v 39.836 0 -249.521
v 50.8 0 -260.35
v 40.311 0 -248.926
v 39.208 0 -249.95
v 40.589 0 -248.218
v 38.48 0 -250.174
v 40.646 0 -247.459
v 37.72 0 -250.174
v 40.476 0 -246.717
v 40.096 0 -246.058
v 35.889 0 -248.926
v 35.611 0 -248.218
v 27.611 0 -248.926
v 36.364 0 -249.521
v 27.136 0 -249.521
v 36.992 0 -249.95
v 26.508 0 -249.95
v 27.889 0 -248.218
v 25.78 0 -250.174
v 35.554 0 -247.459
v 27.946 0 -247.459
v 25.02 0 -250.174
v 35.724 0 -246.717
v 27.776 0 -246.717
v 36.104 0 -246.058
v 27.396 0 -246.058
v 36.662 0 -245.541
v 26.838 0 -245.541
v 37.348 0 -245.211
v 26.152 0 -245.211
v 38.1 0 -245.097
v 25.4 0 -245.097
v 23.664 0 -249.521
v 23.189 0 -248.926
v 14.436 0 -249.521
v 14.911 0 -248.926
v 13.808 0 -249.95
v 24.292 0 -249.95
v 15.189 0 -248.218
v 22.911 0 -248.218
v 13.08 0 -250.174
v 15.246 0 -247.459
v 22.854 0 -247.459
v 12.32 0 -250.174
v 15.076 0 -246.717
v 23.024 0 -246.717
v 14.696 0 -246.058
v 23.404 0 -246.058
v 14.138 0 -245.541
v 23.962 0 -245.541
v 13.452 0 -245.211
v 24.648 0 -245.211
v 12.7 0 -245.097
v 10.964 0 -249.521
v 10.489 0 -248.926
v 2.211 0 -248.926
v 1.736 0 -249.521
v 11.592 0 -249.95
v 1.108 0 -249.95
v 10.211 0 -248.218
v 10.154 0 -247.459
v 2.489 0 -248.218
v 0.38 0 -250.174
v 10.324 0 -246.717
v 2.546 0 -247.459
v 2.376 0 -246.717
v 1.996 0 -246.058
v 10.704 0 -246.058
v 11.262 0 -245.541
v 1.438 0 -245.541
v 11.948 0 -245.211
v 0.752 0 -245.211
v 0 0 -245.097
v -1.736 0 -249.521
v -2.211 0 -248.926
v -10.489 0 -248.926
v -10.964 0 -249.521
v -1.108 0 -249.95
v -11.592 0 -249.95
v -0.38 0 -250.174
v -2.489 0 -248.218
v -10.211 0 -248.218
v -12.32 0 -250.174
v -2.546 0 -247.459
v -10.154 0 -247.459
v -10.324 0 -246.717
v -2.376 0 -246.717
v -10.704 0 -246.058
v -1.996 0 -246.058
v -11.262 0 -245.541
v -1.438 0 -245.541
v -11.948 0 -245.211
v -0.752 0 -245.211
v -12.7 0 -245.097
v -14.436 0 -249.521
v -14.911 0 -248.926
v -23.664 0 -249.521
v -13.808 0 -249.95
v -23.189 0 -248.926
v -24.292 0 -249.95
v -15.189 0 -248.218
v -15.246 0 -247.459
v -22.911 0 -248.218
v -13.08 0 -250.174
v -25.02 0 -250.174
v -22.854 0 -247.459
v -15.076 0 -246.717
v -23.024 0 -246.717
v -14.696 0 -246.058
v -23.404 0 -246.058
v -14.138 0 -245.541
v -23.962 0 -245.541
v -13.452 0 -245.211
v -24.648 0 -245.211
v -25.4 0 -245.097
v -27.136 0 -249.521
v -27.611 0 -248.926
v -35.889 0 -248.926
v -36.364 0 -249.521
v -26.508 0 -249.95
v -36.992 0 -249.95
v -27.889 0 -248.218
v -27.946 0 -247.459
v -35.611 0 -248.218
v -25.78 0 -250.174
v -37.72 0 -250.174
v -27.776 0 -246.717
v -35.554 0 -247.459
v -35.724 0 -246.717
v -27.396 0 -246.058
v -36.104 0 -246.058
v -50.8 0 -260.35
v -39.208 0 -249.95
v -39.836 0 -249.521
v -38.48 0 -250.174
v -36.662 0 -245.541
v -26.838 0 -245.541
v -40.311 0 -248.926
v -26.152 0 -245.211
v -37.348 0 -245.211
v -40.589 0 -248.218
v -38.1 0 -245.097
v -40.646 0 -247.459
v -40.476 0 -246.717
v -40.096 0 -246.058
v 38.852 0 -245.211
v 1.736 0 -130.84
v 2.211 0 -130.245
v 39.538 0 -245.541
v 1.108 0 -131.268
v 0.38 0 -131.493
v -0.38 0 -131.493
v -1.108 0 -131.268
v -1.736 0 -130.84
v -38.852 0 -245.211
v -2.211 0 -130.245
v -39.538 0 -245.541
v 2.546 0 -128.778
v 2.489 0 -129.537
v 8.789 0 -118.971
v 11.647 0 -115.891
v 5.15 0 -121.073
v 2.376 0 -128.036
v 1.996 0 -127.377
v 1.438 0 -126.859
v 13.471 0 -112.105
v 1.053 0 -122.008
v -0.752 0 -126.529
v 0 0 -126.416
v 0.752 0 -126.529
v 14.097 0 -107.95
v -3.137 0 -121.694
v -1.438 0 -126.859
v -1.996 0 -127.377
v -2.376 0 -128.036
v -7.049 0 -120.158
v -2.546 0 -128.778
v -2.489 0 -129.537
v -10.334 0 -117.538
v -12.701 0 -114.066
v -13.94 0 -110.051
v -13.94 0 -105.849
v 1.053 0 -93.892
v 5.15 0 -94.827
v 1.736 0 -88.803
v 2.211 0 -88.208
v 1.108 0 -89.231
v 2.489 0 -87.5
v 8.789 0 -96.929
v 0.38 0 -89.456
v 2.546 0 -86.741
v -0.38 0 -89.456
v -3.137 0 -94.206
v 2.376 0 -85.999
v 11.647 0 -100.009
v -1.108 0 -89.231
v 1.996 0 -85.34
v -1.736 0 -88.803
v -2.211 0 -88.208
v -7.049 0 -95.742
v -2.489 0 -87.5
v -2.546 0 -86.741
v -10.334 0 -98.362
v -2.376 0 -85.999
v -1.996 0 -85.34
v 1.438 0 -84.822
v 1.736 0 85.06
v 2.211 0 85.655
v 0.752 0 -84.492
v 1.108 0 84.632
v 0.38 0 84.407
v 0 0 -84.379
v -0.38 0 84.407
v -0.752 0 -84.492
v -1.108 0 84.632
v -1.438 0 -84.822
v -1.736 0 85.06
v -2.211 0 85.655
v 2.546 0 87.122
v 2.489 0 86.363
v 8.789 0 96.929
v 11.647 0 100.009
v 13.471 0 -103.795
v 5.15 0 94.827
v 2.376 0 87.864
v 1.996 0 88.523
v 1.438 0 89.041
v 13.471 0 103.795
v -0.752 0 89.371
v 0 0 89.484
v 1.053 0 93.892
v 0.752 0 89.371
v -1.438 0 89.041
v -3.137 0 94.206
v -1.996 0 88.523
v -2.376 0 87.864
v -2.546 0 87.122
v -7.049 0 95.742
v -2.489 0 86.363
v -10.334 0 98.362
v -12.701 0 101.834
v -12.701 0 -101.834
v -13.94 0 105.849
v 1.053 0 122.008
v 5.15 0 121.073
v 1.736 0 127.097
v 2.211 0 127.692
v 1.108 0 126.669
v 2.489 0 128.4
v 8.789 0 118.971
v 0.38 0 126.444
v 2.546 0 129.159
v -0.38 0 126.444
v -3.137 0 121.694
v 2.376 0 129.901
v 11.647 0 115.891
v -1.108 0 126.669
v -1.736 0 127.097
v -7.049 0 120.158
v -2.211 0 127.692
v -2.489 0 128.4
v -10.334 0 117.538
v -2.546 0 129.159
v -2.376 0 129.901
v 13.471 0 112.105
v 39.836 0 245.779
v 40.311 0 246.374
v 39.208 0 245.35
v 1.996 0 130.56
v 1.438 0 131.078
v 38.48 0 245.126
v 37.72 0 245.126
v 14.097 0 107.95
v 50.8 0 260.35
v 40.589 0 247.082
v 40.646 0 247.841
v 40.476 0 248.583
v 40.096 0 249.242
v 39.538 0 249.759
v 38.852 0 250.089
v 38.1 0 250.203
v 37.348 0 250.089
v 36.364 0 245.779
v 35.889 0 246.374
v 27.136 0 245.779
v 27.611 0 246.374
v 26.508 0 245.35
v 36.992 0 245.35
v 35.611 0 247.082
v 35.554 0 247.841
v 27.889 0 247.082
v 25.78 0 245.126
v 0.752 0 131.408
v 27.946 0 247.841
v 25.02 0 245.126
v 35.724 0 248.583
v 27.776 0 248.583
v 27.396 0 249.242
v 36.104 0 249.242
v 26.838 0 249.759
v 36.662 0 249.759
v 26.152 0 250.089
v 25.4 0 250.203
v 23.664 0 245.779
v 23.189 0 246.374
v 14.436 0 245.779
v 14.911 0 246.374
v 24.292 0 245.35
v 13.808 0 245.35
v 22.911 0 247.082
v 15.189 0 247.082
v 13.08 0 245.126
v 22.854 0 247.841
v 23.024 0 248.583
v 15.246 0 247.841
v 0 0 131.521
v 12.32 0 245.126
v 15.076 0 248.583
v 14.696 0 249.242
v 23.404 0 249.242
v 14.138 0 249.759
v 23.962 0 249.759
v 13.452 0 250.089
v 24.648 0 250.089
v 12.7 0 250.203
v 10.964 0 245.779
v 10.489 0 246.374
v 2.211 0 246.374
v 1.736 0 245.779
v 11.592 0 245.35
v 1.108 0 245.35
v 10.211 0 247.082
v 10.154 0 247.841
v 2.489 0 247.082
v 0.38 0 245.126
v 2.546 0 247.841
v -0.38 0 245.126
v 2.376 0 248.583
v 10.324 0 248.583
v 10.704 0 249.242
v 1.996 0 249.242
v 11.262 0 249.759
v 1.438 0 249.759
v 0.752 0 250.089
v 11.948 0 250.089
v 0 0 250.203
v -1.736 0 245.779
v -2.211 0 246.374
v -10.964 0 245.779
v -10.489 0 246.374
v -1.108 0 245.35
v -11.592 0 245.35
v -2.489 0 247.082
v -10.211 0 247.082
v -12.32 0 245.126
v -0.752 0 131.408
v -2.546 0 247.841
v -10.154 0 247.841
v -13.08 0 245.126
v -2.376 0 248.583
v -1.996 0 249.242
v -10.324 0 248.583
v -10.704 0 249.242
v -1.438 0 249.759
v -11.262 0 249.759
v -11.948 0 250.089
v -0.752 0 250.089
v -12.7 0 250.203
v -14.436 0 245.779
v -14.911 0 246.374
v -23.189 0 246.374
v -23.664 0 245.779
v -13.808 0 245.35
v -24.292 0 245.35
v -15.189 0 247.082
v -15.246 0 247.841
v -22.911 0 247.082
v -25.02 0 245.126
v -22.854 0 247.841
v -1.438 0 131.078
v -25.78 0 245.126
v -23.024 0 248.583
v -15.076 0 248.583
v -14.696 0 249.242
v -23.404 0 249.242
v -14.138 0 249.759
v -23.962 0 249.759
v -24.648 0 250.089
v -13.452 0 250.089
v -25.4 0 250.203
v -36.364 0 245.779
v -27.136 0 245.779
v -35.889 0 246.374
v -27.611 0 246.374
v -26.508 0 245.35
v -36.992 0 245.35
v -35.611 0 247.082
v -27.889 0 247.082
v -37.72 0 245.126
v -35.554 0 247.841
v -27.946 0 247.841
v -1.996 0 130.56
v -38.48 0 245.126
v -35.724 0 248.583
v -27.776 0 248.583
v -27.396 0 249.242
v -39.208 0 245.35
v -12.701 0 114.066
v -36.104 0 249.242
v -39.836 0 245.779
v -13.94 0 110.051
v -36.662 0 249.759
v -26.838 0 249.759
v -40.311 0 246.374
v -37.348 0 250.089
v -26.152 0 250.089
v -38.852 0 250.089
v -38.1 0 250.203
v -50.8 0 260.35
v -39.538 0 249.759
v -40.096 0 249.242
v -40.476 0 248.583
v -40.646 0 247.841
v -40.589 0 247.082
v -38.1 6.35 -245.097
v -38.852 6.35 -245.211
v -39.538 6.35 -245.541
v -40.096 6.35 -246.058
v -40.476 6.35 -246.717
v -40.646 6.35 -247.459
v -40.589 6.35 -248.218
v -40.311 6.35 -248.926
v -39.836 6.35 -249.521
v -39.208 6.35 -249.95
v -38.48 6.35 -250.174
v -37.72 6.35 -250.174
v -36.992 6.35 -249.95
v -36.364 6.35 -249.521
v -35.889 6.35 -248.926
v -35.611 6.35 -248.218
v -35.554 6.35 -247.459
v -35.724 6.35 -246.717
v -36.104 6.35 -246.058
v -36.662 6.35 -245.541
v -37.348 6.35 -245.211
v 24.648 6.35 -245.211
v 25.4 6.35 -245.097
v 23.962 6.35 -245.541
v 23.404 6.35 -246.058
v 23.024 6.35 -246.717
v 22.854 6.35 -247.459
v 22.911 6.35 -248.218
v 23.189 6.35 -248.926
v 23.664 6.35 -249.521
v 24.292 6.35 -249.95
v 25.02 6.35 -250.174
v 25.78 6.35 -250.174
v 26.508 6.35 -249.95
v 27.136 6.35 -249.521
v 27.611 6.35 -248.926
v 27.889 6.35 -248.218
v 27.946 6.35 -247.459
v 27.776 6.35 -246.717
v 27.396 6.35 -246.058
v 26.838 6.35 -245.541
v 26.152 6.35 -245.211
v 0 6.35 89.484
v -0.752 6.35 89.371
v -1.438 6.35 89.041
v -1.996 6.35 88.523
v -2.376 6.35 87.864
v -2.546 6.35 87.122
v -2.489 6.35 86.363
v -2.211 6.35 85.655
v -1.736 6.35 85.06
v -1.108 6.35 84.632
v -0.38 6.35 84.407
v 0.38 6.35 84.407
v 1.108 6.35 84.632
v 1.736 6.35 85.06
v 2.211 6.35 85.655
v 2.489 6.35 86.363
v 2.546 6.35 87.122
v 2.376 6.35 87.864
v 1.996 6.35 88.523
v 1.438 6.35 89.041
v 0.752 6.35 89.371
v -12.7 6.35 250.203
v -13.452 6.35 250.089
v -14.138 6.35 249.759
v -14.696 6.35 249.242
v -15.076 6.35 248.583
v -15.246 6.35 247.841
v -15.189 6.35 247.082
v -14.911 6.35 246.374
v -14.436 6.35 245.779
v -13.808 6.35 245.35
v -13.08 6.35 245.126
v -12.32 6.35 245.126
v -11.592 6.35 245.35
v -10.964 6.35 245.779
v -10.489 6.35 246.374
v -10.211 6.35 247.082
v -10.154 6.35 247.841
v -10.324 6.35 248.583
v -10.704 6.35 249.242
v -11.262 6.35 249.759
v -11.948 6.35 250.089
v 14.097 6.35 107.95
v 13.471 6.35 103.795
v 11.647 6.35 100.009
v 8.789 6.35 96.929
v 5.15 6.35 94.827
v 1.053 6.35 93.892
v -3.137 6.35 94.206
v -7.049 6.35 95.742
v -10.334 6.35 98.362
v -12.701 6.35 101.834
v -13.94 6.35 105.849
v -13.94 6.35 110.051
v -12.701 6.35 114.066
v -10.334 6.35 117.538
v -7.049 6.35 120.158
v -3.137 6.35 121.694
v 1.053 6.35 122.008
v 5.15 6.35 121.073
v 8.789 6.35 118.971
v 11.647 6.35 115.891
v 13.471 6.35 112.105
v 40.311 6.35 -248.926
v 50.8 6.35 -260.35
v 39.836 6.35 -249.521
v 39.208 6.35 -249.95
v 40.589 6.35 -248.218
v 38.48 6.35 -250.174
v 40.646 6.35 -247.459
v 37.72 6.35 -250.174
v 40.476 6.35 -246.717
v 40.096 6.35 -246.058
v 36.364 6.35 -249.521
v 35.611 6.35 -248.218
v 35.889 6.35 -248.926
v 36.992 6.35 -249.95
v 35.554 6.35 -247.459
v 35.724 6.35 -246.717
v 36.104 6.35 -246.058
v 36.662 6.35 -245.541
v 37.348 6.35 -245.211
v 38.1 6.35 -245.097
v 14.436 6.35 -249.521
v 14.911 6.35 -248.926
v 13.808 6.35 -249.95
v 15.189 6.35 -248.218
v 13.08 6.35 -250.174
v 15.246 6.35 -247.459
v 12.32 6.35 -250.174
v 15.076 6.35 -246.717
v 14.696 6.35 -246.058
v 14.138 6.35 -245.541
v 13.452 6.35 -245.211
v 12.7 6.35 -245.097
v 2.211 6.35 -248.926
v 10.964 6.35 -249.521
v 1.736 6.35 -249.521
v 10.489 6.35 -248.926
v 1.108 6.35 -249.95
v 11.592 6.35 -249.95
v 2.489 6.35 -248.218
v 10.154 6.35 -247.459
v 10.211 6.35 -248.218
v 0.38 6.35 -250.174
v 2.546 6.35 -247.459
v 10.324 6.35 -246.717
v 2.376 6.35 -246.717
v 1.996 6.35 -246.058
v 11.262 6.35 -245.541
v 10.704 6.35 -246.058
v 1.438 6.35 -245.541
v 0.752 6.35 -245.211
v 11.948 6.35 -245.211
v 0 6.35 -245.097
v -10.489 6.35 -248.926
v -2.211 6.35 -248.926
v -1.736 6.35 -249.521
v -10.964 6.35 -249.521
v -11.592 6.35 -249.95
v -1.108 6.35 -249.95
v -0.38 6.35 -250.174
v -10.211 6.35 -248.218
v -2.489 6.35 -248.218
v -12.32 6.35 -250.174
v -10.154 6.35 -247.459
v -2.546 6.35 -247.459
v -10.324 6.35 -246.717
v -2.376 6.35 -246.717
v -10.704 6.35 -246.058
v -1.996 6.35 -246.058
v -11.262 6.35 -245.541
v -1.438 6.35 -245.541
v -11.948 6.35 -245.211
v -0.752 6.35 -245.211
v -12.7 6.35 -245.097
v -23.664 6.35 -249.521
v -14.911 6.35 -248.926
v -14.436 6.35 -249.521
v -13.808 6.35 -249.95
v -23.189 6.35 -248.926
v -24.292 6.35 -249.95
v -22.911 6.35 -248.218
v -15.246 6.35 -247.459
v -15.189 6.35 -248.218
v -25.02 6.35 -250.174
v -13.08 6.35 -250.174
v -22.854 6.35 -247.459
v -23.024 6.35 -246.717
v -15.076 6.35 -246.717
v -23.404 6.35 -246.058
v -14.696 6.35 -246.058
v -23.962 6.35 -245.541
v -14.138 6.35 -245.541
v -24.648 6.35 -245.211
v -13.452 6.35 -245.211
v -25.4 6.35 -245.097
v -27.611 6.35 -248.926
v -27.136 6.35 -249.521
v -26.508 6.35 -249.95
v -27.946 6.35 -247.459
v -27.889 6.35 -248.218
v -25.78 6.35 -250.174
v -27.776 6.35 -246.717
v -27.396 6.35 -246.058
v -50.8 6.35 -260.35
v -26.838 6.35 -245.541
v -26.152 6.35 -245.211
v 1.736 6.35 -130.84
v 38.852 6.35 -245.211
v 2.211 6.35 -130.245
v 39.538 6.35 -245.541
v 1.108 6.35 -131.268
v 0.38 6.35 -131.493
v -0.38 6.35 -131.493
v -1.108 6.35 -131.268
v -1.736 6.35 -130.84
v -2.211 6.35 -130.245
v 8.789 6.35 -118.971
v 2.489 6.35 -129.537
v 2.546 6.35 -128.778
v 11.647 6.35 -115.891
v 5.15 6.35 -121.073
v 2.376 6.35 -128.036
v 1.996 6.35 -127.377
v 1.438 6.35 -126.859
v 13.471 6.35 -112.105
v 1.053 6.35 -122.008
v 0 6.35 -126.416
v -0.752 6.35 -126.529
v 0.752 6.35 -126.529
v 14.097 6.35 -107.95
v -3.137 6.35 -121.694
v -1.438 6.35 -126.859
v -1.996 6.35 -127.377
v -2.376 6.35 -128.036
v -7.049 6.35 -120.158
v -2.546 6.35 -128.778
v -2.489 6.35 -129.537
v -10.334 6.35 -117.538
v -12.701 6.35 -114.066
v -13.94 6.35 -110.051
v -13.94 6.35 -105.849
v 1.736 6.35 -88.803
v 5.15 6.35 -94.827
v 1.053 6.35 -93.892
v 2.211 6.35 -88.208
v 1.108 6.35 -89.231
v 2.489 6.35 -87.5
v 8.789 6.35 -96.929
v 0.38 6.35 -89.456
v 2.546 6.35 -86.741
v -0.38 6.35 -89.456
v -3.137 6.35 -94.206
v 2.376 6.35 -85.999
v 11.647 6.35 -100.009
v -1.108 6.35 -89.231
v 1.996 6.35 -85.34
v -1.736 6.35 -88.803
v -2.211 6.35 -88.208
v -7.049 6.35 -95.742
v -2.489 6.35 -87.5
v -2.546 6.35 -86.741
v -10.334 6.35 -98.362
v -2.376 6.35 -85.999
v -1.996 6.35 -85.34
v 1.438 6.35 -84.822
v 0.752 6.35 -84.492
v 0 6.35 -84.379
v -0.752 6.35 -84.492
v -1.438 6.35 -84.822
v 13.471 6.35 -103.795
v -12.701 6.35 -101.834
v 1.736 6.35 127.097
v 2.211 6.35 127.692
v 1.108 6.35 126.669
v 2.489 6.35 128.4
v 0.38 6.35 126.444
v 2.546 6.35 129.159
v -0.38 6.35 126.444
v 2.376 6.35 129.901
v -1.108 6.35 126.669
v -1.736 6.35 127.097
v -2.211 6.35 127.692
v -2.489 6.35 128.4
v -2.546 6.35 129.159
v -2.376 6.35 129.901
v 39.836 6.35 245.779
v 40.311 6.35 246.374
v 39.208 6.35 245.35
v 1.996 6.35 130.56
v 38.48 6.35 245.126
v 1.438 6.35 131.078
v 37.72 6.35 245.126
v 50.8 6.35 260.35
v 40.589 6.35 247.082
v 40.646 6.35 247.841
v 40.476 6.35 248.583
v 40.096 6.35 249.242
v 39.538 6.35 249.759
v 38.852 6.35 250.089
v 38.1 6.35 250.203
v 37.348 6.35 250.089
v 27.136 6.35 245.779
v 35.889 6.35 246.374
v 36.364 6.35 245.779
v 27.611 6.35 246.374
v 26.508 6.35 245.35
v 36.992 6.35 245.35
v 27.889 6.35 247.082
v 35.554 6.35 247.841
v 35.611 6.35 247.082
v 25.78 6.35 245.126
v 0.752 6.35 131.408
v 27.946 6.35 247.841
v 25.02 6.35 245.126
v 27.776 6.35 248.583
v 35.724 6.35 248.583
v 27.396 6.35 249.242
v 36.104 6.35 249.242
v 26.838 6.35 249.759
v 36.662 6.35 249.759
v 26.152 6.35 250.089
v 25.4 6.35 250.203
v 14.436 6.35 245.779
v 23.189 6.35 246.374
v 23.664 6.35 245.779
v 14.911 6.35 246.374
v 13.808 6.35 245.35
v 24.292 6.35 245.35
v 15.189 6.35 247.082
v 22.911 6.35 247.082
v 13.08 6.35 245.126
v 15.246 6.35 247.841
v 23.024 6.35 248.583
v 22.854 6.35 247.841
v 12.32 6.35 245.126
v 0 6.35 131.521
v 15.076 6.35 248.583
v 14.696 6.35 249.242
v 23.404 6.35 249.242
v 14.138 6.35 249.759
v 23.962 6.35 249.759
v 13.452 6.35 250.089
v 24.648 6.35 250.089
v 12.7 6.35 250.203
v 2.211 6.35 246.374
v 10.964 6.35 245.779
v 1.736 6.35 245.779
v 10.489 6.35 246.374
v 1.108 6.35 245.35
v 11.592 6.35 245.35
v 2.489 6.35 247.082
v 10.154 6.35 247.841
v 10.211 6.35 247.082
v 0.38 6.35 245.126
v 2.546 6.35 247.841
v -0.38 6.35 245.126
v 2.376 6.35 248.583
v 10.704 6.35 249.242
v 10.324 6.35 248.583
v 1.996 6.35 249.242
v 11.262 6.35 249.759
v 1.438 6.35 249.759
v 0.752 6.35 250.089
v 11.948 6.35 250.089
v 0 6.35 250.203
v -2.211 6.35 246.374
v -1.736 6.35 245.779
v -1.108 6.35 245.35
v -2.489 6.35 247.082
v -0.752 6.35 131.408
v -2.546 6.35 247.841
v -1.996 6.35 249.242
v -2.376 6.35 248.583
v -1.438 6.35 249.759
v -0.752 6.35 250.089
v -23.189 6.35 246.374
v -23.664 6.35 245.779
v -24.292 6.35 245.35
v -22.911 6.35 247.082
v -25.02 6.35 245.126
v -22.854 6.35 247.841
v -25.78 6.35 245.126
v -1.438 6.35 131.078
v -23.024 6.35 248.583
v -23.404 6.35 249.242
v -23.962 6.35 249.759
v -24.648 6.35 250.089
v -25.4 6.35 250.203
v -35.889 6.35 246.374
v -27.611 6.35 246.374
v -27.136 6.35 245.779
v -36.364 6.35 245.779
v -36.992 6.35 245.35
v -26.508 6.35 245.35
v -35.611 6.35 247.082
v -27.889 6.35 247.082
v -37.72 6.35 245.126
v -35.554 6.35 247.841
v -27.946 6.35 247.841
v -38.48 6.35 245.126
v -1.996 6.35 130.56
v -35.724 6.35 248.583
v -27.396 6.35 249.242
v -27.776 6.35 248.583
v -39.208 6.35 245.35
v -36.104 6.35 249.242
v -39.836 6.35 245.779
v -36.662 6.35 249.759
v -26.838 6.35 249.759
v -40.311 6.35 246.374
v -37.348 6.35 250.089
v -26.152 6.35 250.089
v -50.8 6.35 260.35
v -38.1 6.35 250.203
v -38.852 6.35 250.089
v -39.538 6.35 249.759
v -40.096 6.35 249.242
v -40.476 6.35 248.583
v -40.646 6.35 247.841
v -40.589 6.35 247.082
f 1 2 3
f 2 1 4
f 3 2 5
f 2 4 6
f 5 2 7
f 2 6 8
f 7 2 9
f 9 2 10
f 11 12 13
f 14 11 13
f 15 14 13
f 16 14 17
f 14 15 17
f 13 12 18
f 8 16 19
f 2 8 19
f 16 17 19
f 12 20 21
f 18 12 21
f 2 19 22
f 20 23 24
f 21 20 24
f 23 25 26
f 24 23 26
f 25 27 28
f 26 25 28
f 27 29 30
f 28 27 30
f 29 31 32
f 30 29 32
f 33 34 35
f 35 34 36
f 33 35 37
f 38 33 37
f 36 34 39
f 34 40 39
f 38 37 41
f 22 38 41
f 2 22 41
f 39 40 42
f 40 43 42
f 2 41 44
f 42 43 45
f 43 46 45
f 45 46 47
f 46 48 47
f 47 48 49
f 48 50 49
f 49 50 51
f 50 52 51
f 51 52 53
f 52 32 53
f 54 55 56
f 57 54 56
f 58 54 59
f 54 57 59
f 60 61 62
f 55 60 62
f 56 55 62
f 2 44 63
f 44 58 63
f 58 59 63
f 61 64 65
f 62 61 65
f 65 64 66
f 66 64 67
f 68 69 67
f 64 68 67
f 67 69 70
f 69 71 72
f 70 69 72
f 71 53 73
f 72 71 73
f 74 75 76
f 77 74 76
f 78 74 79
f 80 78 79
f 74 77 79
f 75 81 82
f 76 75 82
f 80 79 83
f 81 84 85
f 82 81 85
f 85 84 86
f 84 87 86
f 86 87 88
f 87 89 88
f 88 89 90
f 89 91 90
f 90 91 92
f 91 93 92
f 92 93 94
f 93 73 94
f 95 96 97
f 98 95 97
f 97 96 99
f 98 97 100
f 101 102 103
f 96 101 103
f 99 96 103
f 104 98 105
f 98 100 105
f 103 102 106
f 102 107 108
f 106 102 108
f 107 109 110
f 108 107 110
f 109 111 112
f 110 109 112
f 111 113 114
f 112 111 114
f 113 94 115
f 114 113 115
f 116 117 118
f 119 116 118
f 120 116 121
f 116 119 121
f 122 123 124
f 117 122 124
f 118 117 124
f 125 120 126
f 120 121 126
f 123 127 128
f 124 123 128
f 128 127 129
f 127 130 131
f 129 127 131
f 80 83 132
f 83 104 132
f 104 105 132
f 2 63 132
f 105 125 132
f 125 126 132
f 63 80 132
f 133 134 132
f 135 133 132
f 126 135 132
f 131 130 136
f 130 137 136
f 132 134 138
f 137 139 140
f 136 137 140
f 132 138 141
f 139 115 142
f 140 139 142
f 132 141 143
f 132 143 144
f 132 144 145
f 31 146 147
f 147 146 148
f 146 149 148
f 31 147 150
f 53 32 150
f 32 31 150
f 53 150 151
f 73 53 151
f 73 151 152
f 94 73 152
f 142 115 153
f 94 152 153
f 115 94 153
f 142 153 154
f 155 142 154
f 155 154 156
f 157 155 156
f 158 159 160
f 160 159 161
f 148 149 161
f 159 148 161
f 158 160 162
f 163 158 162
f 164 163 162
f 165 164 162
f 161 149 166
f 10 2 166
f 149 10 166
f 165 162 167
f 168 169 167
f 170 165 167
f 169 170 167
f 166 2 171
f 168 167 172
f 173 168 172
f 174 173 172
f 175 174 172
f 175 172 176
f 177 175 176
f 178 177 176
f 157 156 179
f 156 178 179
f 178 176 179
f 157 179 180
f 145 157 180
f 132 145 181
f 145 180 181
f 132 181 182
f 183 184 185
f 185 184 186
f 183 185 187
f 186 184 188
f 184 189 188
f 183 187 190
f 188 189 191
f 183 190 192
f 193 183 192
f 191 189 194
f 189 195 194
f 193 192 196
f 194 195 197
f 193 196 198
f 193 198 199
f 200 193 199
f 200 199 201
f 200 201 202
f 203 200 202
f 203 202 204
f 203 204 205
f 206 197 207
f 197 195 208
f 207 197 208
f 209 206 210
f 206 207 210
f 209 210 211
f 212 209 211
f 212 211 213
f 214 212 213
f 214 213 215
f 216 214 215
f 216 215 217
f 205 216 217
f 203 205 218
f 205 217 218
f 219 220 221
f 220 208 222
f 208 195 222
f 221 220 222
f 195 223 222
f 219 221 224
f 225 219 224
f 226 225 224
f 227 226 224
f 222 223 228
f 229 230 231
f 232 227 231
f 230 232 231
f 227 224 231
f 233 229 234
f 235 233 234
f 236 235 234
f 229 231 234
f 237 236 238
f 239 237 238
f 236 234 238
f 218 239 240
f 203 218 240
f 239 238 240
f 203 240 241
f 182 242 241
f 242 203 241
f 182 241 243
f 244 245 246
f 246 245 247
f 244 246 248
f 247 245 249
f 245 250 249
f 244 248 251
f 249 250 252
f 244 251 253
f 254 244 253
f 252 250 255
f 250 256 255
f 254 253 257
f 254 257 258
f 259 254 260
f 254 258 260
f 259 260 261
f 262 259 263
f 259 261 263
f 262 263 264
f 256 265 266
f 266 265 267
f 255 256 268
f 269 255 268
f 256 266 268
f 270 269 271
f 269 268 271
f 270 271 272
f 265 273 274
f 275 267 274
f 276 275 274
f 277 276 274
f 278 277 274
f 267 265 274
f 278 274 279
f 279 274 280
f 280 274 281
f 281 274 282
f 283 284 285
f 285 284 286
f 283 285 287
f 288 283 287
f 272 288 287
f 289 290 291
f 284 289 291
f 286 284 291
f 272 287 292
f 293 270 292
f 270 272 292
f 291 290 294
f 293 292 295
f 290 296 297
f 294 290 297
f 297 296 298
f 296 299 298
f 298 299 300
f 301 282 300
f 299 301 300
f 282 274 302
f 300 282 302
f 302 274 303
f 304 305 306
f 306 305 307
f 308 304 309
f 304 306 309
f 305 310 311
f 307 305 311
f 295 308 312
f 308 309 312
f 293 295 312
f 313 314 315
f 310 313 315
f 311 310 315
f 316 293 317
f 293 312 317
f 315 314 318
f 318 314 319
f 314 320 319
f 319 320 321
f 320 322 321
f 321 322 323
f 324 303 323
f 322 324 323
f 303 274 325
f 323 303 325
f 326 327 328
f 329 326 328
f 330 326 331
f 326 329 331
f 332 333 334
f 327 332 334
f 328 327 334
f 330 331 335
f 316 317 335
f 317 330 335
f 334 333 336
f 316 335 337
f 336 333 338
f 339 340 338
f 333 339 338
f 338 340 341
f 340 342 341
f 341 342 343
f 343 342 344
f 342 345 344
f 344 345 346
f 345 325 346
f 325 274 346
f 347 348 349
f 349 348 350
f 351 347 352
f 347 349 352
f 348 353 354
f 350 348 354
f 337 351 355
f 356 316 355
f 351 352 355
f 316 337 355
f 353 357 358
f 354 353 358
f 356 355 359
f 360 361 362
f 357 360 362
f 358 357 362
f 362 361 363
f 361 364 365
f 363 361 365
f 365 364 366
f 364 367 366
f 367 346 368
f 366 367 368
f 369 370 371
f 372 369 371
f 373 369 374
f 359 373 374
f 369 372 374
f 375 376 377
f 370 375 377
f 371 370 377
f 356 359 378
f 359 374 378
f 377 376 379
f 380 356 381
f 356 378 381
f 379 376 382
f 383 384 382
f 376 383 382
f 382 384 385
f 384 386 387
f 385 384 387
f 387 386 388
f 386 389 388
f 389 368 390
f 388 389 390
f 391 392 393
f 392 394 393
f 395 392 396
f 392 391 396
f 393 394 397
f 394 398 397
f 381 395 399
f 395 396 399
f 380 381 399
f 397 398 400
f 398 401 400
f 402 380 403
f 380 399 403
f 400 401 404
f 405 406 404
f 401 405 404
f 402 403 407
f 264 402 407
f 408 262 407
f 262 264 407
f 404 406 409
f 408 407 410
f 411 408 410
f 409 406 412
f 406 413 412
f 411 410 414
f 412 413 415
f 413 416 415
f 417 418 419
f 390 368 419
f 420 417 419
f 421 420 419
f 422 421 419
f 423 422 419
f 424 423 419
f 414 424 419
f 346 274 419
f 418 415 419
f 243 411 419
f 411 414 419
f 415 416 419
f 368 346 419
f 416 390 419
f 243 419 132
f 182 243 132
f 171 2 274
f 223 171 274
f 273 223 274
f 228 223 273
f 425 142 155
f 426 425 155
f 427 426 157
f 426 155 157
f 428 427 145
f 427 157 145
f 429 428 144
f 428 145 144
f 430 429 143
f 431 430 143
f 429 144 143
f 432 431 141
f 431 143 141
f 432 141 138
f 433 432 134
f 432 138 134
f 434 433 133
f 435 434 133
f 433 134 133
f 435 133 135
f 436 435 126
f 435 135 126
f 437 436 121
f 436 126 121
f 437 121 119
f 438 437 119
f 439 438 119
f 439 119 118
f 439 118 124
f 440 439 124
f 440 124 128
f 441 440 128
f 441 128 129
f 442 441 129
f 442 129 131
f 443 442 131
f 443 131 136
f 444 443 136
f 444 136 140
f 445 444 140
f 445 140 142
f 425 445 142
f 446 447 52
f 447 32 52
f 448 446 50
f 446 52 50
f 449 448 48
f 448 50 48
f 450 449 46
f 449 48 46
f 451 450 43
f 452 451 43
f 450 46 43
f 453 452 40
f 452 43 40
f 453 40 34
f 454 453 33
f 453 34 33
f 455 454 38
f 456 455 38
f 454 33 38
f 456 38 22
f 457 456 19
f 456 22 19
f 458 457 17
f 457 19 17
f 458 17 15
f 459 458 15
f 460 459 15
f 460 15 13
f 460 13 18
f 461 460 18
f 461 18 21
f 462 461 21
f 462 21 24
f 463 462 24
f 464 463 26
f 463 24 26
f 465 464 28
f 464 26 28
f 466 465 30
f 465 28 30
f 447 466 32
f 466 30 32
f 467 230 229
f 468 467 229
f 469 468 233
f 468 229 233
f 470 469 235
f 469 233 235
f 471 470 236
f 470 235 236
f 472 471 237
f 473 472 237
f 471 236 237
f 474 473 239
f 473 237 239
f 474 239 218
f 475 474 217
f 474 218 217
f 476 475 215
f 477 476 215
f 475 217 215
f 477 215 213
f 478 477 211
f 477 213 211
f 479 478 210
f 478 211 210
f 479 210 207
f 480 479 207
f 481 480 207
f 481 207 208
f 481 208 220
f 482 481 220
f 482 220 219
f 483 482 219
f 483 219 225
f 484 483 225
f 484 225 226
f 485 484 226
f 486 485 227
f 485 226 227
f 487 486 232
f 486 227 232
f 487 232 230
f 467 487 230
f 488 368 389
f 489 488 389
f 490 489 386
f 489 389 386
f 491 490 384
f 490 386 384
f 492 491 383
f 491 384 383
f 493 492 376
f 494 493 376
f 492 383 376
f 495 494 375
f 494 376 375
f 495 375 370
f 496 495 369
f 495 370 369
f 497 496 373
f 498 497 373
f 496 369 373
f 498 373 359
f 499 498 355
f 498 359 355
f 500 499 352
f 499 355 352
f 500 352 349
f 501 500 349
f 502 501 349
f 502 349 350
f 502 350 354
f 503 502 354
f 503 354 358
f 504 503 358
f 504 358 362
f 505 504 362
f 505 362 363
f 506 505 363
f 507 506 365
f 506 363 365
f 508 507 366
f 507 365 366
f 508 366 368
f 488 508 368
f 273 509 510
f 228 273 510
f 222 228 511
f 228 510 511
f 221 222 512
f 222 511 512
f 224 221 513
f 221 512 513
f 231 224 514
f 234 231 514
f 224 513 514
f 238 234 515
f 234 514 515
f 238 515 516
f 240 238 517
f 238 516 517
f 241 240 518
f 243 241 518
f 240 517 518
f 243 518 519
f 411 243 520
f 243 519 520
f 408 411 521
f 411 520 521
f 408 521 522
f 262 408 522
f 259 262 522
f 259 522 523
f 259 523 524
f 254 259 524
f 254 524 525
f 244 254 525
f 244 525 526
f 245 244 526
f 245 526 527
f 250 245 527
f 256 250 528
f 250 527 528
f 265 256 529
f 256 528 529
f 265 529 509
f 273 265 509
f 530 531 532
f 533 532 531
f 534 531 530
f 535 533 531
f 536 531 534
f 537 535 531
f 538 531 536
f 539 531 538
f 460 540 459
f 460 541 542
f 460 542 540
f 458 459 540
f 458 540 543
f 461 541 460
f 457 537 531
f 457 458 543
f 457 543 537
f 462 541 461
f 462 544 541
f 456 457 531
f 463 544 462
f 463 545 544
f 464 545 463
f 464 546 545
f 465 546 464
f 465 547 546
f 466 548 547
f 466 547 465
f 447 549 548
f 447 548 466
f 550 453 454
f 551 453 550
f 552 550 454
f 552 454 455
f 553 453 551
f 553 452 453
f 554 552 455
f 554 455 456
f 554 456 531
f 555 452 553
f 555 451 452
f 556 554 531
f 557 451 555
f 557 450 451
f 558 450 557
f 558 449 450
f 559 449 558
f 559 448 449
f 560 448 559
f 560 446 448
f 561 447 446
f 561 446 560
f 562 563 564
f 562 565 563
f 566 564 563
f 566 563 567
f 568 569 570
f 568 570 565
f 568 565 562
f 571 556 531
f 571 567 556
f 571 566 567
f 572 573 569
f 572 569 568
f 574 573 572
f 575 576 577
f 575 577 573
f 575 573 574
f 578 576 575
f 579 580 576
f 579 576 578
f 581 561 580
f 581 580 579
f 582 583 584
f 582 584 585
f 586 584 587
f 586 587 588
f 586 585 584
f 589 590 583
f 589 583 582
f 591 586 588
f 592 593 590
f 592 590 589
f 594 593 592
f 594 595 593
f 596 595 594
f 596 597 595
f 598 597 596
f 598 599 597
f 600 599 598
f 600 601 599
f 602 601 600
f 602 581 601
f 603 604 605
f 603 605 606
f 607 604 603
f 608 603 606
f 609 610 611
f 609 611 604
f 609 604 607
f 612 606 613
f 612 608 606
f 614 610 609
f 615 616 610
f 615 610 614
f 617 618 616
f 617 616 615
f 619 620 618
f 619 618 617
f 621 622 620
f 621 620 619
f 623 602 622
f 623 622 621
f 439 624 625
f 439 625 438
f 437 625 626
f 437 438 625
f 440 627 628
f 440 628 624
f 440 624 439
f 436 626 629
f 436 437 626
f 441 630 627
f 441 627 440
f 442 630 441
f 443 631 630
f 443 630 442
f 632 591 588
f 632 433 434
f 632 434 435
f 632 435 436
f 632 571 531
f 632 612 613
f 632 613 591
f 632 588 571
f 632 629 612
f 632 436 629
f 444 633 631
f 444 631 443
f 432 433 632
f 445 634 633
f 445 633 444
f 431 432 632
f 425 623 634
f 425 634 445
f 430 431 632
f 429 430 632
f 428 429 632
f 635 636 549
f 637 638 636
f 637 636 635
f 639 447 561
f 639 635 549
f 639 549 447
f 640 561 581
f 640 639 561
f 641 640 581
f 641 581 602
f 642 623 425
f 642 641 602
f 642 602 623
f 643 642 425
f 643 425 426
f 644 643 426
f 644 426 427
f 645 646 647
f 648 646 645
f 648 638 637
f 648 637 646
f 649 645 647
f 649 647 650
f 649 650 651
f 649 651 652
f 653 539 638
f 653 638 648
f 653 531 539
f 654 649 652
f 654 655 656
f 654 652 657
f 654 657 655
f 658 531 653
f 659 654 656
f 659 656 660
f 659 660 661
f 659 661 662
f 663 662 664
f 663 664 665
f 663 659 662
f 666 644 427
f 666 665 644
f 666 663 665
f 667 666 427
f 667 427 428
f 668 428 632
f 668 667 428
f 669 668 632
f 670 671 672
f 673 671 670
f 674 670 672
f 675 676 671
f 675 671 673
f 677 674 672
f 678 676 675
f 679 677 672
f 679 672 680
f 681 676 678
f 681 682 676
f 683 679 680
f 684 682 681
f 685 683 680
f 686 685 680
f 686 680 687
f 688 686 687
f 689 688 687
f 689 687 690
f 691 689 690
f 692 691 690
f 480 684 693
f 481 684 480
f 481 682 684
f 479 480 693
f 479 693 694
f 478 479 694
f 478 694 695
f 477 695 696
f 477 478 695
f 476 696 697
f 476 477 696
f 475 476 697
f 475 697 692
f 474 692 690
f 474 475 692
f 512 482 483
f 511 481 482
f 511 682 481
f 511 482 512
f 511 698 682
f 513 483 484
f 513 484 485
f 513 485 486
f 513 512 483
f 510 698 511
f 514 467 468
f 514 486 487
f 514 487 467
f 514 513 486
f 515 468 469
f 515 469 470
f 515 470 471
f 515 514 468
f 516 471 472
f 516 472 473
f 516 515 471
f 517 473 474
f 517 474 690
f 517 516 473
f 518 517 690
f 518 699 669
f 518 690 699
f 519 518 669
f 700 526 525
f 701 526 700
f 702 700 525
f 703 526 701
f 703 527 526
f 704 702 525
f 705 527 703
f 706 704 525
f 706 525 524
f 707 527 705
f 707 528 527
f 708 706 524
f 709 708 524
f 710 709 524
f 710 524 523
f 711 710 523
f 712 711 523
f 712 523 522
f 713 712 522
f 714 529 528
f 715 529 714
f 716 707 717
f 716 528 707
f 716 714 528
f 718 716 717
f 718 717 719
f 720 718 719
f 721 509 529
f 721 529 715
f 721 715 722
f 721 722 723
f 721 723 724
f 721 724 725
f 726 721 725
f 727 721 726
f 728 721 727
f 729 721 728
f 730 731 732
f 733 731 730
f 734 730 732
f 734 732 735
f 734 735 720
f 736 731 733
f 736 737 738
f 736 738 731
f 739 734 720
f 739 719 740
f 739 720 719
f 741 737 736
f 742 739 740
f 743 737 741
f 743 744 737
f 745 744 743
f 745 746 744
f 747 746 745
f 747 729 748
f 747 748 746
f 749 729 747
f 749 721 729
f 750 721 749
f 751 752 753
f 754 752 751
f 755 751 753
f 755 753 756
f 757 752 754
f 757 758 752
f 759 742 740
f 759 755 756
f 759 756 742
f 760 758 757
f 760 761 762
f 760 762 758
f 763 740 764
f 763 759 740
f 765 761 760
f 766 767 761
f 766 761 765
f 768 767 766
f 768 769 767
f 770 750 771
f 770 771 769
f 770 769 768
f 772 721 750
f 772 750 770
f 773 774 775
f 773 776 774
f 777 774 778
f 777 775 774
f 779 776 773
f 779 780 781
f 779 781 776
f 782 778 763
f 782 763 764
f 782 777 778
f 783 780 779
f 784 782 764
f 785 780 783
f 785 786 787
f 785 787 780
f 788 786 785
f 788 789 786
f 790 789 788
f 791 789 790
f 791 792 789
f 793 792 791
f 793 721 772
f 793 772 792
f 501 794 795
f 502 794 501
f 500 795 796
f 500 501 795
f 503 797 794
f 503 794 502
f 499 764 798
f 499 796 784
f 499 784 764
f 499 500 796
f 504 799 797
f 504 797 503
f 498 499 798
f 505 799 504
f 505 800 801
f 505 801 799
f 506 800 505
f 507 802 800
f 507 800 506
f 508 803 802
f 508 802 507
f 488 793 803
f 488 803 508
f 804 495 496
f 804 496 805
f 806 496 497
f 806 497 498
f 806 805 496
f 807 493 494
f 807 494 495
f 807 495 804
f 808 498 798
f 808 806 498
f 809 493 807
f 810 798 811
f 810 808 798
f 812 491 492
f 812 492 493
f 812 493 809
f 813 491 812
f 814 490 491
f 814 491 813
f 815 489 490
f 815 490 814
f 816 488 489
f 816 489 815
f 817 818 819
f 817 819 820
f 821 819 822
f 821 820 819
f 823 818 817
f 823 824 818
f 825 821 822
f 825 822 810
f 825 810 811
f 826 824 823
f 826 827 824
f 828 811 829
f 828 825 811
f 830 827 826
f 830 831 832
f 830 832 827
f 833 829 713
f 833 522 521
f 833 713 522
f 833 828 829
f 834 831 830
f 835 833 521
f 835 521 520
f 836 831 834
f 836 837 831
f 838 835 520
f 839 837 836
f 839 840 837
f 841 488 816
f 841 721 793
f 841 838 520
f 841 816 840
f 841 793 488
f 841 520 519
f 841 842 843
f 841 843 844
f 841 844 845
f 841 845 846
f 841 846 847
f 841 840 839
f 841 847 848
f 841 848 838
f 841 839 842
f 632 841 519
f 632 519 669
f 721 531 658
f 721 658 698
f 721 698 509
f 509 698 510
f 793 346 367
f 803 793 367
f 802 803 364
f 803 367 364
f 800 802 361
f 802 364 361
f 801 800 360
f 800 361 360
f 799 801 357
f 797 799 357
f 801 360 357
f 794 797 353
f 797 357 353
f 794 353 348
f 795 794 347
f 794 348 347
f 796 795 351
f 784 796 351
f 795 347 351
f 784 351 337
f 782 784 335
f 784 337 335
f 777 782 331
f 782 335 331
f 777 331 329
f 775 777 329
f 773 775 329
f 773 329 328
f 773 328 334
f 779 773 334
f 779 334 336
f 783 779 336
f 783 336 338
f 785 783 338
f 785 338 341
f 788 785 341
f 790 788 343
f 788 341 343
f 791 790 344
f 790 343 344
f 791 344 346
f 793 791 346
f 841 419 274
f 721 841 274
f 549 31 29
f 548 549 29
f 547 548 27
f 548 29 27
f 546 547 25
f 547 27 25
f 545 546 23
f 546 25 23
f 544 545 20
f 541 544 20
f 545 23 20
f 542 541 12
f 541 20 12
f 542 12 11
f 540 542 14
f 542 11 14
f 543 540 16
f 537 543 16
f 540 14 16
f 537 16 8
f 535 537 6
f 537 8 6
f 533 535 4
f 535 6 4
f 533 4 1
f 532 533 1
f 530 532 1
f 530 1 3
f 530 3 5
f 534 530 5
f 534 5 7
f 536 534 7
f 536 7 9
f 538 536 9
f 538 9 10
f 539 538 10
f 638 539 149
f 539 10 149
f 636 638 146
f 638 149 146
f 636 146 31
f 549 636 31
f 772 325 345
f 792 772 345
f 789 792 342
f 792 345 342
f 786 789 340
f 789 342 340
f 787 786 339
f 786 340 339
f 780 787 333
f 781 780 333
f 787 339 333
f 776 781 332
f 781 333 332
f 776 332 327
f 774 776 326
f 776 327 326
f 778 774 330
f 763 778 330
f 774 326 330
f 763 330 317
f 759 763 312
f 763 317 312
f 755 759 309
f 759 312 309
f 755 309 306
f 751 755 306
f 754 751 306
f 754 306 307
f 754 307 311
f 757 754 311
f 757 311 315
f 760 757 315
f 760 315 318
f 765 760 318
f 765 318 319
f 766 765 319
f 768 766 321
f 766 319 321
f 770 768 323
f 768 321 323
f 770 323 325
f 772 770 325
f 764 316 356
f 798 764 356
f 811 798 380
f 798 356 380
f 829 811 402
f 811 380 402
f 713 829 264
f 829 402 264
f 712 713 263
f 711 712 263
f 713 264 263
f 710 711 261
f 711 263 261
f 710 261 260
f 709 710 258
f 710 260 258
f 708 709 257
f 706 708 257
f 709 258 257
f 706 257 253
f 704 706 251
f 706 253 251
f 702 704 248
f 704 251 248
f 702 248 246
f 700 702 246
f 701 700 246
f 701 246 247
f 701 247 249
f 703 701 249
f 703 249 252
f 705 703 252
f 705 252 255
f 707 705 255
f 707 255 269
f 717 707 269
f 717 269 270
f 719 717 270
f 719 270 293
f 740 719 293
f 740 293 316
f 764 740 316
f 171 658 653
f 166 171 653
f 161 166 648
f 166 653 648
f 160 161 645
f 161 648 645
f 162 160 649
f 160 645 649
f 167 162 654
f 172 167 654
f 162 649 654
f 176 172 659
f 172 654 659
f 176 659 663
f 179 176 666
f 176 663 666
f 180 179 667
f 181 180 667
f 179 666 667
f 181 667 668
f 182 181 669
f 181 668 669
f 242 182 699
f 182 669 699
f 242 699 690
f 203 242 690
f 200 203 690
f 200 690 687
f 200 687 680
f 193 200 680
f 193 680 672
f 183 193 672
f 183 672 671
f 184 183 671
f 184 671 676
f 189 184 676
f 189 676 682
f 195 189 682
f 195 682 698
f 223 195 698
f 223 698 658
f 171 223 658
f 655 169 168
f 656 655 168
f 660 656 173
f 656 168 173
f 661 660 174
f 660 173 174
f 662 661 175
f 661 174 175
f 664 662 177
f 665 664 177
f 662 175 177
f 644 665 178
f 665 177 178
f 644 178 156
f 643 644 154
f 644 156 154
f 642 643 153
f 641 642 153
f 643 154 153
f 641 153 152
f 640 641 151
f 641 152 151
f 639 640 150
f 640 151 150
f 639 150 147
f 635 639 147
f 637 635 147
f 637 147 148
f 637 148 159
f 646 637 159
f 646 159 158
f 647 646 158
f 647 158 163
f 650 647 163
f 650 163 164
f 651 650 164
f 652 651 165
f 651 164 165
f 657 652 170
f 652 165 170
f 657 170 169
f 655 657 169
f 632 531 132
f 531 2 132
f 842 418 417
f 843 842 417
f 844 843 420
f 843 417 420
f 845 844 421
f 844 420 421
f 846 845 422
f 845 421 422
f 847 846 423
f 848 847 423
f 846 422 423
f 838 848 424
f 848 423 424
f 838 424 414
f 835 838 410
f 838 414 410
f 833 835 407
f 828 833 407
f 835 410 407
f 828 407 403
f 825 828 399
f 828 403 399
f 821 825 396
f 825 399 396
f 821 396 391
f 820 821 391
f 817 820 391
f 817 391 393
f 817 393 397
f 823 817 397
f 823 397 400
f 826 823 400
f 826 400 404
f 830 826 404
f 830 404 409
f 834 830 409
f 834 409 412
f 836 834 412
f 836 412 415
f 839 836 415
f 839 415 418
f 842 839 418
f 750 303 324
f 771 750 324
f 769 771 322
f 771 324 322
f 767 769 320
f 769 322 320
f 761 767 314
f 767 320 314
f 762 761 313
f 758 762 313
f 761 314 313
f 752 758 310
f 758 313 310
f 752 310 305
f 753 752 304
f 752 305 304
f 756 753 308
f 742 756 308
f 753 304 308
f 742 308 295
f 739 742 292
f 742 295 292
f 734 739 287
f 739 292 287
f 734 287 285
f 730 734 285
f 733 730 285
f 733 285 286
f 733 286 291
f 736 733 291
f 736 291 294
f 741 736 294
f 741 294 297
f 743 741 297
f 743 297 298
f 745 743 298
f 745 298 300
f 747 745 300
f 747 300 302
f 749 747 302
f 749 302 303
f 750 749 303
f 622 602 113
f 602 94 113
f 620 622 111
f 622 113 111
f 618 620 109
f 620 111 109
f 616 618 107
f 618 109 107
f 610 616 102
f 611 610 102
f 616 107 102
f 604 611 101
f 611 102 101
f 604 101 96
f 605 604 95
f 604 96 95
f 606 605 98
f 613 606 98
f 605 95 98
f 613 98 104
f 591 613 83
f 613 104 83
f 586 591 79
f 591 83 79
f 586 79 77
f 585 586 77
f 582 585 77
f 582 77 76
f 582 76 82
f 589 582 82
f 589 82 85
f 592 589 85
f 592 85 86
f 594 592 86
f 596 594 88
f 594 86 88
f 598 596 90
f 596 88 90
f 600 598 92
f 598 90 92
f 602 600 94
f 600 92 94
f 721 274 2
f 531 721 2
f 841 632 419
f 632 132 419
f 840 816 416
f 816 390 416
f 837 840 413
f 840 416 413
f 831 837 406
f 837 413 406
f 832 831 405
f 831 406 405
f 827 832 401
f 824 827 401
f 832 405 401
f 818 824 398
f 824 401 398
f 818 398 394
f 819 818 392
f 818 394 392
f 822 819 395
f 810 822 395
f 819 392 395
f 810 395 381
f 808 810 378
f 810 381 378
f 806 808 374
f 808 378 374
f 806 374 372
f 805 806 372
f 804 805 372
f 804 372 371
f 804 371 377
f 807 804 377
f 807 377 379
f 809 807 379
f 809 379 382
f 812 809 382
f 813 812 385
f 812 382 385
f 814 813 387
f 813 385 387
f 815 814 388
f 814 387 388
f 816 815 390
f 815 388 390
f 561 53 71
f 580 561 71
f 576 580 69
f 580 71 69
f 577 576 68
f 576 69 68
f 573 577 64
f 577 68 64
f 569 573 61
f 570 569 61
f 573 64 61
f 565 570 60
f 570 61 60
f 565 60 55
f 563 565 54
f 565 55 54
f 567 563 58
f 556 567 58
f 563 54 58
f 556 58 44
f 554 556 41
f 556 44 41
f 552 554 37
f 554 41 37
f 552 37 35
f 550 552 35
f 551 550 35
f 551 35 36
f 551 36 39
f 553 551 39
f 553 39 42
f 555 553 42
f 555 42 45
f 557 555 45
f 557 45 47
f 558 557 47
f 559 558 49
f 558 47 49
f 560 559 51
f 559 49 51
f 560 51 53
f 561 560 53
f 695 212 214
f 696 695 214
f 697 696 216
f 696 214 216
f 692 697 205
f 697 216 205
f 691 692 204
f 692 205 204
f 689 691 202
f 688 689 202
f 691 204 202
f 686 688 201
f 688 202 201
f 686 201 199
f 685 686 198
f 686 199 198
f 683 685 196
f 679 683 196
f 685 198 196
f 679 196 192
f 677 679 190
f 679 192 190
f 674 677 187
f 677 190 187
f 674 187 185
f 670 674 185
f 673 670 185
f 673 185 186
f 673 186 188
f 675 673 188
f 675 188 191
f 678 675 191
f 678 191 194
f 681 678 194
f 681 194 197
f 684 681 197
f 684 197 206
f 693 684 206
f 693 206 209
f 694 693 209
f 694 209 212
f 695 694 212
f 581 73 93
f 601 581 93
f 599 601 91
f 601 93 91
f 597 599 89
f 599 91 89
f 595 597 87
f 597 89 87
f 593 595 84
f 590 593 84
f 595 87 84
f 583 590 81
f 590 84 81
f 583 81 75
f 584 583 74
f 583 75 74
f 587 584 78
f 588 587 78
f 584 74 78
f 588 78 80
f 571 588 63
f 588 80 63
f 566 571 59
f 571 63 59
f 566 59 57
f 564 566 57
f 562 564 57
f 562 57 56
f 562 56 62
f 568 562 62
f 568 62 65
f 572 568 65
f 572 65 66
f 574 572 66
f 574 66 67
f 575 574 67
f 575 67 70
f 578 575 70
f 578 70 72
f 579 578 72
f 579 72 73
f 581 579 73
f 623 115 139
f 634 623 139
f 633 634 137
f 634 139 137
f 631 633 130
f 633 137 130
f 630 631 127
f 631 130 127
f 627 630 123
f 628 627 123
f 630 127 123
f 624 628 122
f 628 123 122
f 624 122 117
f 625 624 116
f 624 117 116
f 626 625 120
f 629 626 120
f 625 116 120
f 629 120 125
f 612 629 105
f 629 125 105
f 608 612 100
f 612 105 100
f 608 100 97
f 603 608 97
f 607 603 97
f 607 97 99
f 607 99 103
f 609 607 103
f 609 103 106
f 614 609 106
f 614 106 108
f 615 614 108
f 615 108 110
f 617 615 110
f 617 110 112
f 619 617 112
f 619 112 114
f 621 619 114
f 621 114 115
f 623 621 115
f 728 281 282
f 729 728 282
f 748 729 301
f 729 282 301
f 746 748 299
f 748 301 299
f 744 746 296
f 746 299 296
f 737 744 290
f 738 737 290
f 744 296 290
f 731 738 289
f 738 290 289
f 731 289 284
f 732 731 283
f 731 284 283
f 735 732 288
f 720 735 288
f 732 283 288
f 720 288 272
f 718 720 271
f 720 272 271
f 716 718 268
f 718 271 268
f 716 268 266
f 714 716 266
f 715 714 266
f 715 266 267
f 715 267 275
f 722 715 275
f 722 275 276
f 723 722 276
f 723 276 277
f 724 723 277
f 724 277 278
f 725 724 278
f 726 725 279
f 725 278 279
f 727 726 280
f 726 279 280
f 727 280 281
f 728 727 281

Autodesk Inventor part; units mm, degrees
ref_plane "YZ Plane" through (0, 0, 0) normal (1, 0, 0) x (0, 1, 0)
ref_plane "XZ Plane" through (0, 0, 0) normal (0, 1, 0) x (-1, 0, 0)
ref_plane "XY Plane" through (0, 0, 0) normal (0, 0, 1) x (1, 0, 0)
sketch "Sketch1" plane through (0, 0, 0) normal (0, 1, 0) x (-1, 0, 0)
  line L0 (-50.8, -260.35) -> (50.8, -260.35)
  line L1 (50.8, -260.35) -> (50.8, 260.35)
  line L2 (50.8, 260.35) -> (-50.8, 260.35)
  line L3 (-50.8, 260.35) -> (-50.8, -260.35)
  line L4 (-50.8, -260.35) -> (50.8, 260.35) construction
  line L5 (50.8, -260.35) -> (-50.8, 260.35) construction
  point P0 (0, 0)
  dimension "d0" = 101.6
  dimension "d1" = 520.7
extrude "Extrusion1" add sketch "Sketch1" along normal blind 6.35
sketch "Sketch2" plane through (0, 6.35, 0) normal (0, 1, 0) x (1, 0, 0)
  circle A0 centre (0, -107.95) radius 14.097
  circle A1 centre (0, 107.95) radius 14.097
  line L0 (0, -107.95) -> (0, 107.95) construction
  circle A2 centre (0, -107.95) radius 63.5 construction
  circle A3 centre (0, 107.95) radius 63.5 construction
  circle A4 centre (-107.4015, 0) radius 57.15 construction
  circle A5 centre (0, 44.5491) radius 14.097
  point P0 (0, 0)
  point P1 (0, 0)
  point P2 (0, -44.45)
  point P3 (0, 44.45)
  dimension "d7" = 127
  dimension "d8" = 127
  dimension "d5" = 28.194
  dimension "d9" = 88.9
  dimension "d10" = 114.3
  dimension "d12" = 152.4991
extrude "Extrusion2" cut sketch "Sketch2" against normal blind 6.35 contours A0 | A1
sketch "Sketch3" plane through (0, 6.35, 0) normal (0, 1, 0) x (1, 0, 0)
  line L0 (-50.8, -260.35) -> (50.8, -260.35) projected
  line L1 (-50.8, 260.35) -> (-50.8, -260.35) projected
  line L2 (-50.8, 260.35) -> (-50.8, -260.35) construction
  line L3 (-50.8, 0) -> (50.8, 0) construction
  line L4 (50.8, -260.35) -> (50.8, 260.35) construction
  point P0 (0, 0)
  point P1 (-38.1, -247.65)
  point P2 (-25.4, -247.65)
  point P3 (-12.7, -247.65)
  point P4 (0, -247.65)
  point P5 (12.7, -247.65)
  point P6 (25.4, -247.65)
  point P7 (38.1, -247.65)
  point P8 (-38.1, 247.65)
  point P9 (-25.4, 247.65)
  point P10 (-12.7, 247.65)
  point P11 (0, 247.65)
  point P12 (12.7, 247.65)
  point P13 (25.4, 247.65)
  point P14 (38.1, 247.65)
  dimension "d15" = 12.7
  dimension "d16" = 12.7
  dimension "d19" = 12.7
hole "Hole1" at (-38.1, 6.35, 247.65) at (-25.4, 6.35, 247.65) at (-12.7, 6.35, 247.65) at (0, 6.35, 247.65) at (12.7, 6.35, 247.65) at (25.4, 6.35, 247.65) at (38.1, 6.35, 247.65) at (38.1, 6.35, -247.65) at (25.4, 6.35, -247.65) at (12.7, 6.35, -247.65) at (0, 6.35, -247.65) at (-12.7, 6.35, -247.65) at (-25.4, 6.35, -247.65) at (-38.1, 6.35, -247.65) direction (0, -1, 0) diameter 5.1054 end through all clearance for "Flat Head Machine Screw (82)" size "#10" standard "Ansi Unified Screw Threads"
sketch "Sketch4" plane through (0, 6.35, 0) normal (0, 1, 0) x (1, 0, 0)
  line L0 (0, -86.9315) -> (0, -128.9685) construction
  line L1 (0, 128.9685) -> (0, 86.9315) construction
  circle A0 centre (-25.4, 247.65) radius 2.5527 projected
  circle A1 centre (0, 247.65) radius 2.5527 projected
  circle A2 centre (25.4, 247.65) radius 2.5527 projected
  circle A3 centre (38.1, -247.65) radius 2.5527 projected
  circle A4 centre (12.7, -247.65) radius 2.5527 projected
  circle A5 centre (-12.7, -247.65) radius 2.5527 projected
  circle A6 centre (-38.1, -247.65) radius 2.5527 projected
  circle A7 centre (-25.4, -247.65) radius 2.5527 projected
  circle A8 centre (0, -247.65) radius 2.5527 projected
  circle A9 centre (25.4, -247.65) radius 2.5527 projected
  circle A10 centre (38.1, 247.65) radius 2.5527 projected
  circle A11 centre (12.7, 247.65) radius 2.5527 projected
  circle A12 centre (-12.7, 247.65) radius 2.5527 projected
  circle A13 centre (-38.1, 247.65) radius 2.5527 projected
  circle A14 centre (0, 107.95) radius 14.097 projected
  circle A15 centre (0, -107.95) radius 14.097 projected
  line L2 (-50.8, 260.35) -> (50.8, 260.35) projected
  line L3 (50.8, 260.35) -> (50.8, -260.35) projected
  line L4 (50.8, -260.35) -> (-50.8, -260.35) projected
  line L5 (-50.8, -260.35) -> (-50.8, 260.35) projected
  point P0 (0, 0)
  dimension "d31" = 42.037
  dimension "d32" = 42.037
hole "Hole2" at (0, 6.35, -128.9685) at (0, 6.35, -86.9315) at (0, 6.35, 86.9315) at (0, 6.35, 128.9685) direction (0, -1, 0) diameter 5.1054 end through all clearance for "Flat Head Machine Screw (82)" size "#10" standard "Ansi Unified Screw Threads"
properties part number "GI - 007" material "Aluminum 6061"
